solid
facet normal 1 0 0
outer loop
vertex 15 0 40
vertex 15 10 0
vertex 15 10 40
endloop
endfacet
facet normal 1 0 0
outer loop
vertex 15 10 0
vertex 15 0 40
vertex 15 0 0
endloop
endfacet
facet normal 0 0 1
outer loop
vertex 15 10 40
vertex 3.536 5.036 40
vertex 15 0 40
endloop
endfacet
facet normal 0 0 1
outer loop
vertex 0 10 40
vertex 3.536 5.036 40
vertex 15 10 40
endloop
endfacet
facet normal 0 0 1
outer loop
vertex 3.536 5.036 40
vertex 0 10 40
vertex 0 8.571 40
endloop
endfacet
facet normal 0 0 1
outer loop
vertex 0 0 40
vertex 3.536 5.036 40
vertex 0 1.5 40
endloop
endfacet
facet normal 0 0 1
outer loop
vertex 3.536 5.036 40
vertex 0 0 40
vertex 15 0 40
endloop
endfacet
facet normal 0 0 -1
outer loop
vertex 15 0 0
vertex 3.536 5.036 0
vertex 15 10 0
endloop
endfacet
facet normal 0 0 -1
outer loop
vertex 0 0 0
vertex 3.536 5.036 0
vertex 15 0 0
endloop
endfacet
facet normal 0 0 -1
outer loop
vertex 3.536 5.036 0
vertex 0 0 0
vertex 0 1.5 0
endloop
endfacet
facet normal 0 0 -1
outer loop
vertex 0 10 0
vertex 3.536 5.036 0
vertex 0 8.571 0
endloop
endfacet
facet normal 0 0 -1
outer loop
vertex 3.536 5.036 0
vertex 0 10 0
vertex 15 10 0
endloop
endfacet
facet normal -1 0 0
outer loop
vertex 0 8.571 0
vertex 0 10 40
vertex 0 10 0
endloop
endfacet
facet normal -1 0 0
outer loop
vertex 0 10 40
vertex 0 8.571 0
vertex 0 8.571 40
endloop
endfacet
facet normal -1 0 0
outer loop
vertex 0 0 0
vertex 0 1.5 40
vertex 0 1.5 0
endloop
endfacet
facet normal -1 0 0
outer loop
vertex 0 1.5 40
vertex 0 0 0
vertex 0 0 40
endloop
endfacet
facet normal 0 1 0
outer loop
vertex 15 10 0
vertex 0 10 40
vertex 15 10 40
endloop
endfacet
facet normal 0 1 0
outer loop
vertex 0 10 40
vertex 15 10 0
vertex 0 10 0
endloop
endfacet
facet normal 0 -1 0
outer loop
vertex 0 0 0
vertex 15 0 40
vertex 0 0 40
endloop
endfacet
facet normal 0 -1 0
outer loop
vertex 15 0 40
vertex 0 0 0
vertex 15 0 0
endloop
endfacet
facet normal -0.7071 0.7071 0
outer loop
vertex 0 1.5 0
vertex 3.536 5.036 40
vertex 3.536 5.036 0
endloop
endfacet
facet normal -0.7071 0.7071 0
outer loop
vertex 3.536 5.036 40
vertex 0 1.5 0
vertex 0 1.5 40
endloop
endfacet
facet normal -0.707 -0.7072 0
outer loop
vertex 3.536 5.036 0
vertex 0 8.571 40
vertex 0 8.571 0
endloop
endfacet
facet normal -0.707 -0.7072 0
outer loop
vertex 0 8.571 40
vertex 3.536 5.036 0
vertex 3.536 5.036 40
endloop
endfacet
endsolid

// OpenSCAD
module top () {
	difference () {
		cube([60,25,15], center=true);
		translate([0,-5,7.5]) {
			rotate([45,0,0]) {
				cube([60,10,10], center=true);
			}
		}
		translate([-24, 7, -7.5]) {
			cylinder(h=40, d=6, $fn=100);
		}
		translate([24, 7, -7.5]) {
			cylinder(h=40, d=6, $fn=100);
		}
	}
	difference () {
		translate([-30,2.5,0]) {
			cube([15,10,40]);
		}
		translate([13,4,7]) {
			rotate([0,0,45]) {
				cube([5,5,40]);
			}
		}
	}
	difference () {
		translate([15,2.5,0]) {
			cube([15,10,40]);
		}
		translate([-13,4,7]) {
			rotate([0,0,45]) {
				cube([5,5,40]);
			}
		}
	}
}


	difference () {
		cube([15,10,40]);
		translate([0,1.5,0]) {
			rotate([0,0,45]) {
				cube([5,5,40]);
			}
		}
	}

//top();
